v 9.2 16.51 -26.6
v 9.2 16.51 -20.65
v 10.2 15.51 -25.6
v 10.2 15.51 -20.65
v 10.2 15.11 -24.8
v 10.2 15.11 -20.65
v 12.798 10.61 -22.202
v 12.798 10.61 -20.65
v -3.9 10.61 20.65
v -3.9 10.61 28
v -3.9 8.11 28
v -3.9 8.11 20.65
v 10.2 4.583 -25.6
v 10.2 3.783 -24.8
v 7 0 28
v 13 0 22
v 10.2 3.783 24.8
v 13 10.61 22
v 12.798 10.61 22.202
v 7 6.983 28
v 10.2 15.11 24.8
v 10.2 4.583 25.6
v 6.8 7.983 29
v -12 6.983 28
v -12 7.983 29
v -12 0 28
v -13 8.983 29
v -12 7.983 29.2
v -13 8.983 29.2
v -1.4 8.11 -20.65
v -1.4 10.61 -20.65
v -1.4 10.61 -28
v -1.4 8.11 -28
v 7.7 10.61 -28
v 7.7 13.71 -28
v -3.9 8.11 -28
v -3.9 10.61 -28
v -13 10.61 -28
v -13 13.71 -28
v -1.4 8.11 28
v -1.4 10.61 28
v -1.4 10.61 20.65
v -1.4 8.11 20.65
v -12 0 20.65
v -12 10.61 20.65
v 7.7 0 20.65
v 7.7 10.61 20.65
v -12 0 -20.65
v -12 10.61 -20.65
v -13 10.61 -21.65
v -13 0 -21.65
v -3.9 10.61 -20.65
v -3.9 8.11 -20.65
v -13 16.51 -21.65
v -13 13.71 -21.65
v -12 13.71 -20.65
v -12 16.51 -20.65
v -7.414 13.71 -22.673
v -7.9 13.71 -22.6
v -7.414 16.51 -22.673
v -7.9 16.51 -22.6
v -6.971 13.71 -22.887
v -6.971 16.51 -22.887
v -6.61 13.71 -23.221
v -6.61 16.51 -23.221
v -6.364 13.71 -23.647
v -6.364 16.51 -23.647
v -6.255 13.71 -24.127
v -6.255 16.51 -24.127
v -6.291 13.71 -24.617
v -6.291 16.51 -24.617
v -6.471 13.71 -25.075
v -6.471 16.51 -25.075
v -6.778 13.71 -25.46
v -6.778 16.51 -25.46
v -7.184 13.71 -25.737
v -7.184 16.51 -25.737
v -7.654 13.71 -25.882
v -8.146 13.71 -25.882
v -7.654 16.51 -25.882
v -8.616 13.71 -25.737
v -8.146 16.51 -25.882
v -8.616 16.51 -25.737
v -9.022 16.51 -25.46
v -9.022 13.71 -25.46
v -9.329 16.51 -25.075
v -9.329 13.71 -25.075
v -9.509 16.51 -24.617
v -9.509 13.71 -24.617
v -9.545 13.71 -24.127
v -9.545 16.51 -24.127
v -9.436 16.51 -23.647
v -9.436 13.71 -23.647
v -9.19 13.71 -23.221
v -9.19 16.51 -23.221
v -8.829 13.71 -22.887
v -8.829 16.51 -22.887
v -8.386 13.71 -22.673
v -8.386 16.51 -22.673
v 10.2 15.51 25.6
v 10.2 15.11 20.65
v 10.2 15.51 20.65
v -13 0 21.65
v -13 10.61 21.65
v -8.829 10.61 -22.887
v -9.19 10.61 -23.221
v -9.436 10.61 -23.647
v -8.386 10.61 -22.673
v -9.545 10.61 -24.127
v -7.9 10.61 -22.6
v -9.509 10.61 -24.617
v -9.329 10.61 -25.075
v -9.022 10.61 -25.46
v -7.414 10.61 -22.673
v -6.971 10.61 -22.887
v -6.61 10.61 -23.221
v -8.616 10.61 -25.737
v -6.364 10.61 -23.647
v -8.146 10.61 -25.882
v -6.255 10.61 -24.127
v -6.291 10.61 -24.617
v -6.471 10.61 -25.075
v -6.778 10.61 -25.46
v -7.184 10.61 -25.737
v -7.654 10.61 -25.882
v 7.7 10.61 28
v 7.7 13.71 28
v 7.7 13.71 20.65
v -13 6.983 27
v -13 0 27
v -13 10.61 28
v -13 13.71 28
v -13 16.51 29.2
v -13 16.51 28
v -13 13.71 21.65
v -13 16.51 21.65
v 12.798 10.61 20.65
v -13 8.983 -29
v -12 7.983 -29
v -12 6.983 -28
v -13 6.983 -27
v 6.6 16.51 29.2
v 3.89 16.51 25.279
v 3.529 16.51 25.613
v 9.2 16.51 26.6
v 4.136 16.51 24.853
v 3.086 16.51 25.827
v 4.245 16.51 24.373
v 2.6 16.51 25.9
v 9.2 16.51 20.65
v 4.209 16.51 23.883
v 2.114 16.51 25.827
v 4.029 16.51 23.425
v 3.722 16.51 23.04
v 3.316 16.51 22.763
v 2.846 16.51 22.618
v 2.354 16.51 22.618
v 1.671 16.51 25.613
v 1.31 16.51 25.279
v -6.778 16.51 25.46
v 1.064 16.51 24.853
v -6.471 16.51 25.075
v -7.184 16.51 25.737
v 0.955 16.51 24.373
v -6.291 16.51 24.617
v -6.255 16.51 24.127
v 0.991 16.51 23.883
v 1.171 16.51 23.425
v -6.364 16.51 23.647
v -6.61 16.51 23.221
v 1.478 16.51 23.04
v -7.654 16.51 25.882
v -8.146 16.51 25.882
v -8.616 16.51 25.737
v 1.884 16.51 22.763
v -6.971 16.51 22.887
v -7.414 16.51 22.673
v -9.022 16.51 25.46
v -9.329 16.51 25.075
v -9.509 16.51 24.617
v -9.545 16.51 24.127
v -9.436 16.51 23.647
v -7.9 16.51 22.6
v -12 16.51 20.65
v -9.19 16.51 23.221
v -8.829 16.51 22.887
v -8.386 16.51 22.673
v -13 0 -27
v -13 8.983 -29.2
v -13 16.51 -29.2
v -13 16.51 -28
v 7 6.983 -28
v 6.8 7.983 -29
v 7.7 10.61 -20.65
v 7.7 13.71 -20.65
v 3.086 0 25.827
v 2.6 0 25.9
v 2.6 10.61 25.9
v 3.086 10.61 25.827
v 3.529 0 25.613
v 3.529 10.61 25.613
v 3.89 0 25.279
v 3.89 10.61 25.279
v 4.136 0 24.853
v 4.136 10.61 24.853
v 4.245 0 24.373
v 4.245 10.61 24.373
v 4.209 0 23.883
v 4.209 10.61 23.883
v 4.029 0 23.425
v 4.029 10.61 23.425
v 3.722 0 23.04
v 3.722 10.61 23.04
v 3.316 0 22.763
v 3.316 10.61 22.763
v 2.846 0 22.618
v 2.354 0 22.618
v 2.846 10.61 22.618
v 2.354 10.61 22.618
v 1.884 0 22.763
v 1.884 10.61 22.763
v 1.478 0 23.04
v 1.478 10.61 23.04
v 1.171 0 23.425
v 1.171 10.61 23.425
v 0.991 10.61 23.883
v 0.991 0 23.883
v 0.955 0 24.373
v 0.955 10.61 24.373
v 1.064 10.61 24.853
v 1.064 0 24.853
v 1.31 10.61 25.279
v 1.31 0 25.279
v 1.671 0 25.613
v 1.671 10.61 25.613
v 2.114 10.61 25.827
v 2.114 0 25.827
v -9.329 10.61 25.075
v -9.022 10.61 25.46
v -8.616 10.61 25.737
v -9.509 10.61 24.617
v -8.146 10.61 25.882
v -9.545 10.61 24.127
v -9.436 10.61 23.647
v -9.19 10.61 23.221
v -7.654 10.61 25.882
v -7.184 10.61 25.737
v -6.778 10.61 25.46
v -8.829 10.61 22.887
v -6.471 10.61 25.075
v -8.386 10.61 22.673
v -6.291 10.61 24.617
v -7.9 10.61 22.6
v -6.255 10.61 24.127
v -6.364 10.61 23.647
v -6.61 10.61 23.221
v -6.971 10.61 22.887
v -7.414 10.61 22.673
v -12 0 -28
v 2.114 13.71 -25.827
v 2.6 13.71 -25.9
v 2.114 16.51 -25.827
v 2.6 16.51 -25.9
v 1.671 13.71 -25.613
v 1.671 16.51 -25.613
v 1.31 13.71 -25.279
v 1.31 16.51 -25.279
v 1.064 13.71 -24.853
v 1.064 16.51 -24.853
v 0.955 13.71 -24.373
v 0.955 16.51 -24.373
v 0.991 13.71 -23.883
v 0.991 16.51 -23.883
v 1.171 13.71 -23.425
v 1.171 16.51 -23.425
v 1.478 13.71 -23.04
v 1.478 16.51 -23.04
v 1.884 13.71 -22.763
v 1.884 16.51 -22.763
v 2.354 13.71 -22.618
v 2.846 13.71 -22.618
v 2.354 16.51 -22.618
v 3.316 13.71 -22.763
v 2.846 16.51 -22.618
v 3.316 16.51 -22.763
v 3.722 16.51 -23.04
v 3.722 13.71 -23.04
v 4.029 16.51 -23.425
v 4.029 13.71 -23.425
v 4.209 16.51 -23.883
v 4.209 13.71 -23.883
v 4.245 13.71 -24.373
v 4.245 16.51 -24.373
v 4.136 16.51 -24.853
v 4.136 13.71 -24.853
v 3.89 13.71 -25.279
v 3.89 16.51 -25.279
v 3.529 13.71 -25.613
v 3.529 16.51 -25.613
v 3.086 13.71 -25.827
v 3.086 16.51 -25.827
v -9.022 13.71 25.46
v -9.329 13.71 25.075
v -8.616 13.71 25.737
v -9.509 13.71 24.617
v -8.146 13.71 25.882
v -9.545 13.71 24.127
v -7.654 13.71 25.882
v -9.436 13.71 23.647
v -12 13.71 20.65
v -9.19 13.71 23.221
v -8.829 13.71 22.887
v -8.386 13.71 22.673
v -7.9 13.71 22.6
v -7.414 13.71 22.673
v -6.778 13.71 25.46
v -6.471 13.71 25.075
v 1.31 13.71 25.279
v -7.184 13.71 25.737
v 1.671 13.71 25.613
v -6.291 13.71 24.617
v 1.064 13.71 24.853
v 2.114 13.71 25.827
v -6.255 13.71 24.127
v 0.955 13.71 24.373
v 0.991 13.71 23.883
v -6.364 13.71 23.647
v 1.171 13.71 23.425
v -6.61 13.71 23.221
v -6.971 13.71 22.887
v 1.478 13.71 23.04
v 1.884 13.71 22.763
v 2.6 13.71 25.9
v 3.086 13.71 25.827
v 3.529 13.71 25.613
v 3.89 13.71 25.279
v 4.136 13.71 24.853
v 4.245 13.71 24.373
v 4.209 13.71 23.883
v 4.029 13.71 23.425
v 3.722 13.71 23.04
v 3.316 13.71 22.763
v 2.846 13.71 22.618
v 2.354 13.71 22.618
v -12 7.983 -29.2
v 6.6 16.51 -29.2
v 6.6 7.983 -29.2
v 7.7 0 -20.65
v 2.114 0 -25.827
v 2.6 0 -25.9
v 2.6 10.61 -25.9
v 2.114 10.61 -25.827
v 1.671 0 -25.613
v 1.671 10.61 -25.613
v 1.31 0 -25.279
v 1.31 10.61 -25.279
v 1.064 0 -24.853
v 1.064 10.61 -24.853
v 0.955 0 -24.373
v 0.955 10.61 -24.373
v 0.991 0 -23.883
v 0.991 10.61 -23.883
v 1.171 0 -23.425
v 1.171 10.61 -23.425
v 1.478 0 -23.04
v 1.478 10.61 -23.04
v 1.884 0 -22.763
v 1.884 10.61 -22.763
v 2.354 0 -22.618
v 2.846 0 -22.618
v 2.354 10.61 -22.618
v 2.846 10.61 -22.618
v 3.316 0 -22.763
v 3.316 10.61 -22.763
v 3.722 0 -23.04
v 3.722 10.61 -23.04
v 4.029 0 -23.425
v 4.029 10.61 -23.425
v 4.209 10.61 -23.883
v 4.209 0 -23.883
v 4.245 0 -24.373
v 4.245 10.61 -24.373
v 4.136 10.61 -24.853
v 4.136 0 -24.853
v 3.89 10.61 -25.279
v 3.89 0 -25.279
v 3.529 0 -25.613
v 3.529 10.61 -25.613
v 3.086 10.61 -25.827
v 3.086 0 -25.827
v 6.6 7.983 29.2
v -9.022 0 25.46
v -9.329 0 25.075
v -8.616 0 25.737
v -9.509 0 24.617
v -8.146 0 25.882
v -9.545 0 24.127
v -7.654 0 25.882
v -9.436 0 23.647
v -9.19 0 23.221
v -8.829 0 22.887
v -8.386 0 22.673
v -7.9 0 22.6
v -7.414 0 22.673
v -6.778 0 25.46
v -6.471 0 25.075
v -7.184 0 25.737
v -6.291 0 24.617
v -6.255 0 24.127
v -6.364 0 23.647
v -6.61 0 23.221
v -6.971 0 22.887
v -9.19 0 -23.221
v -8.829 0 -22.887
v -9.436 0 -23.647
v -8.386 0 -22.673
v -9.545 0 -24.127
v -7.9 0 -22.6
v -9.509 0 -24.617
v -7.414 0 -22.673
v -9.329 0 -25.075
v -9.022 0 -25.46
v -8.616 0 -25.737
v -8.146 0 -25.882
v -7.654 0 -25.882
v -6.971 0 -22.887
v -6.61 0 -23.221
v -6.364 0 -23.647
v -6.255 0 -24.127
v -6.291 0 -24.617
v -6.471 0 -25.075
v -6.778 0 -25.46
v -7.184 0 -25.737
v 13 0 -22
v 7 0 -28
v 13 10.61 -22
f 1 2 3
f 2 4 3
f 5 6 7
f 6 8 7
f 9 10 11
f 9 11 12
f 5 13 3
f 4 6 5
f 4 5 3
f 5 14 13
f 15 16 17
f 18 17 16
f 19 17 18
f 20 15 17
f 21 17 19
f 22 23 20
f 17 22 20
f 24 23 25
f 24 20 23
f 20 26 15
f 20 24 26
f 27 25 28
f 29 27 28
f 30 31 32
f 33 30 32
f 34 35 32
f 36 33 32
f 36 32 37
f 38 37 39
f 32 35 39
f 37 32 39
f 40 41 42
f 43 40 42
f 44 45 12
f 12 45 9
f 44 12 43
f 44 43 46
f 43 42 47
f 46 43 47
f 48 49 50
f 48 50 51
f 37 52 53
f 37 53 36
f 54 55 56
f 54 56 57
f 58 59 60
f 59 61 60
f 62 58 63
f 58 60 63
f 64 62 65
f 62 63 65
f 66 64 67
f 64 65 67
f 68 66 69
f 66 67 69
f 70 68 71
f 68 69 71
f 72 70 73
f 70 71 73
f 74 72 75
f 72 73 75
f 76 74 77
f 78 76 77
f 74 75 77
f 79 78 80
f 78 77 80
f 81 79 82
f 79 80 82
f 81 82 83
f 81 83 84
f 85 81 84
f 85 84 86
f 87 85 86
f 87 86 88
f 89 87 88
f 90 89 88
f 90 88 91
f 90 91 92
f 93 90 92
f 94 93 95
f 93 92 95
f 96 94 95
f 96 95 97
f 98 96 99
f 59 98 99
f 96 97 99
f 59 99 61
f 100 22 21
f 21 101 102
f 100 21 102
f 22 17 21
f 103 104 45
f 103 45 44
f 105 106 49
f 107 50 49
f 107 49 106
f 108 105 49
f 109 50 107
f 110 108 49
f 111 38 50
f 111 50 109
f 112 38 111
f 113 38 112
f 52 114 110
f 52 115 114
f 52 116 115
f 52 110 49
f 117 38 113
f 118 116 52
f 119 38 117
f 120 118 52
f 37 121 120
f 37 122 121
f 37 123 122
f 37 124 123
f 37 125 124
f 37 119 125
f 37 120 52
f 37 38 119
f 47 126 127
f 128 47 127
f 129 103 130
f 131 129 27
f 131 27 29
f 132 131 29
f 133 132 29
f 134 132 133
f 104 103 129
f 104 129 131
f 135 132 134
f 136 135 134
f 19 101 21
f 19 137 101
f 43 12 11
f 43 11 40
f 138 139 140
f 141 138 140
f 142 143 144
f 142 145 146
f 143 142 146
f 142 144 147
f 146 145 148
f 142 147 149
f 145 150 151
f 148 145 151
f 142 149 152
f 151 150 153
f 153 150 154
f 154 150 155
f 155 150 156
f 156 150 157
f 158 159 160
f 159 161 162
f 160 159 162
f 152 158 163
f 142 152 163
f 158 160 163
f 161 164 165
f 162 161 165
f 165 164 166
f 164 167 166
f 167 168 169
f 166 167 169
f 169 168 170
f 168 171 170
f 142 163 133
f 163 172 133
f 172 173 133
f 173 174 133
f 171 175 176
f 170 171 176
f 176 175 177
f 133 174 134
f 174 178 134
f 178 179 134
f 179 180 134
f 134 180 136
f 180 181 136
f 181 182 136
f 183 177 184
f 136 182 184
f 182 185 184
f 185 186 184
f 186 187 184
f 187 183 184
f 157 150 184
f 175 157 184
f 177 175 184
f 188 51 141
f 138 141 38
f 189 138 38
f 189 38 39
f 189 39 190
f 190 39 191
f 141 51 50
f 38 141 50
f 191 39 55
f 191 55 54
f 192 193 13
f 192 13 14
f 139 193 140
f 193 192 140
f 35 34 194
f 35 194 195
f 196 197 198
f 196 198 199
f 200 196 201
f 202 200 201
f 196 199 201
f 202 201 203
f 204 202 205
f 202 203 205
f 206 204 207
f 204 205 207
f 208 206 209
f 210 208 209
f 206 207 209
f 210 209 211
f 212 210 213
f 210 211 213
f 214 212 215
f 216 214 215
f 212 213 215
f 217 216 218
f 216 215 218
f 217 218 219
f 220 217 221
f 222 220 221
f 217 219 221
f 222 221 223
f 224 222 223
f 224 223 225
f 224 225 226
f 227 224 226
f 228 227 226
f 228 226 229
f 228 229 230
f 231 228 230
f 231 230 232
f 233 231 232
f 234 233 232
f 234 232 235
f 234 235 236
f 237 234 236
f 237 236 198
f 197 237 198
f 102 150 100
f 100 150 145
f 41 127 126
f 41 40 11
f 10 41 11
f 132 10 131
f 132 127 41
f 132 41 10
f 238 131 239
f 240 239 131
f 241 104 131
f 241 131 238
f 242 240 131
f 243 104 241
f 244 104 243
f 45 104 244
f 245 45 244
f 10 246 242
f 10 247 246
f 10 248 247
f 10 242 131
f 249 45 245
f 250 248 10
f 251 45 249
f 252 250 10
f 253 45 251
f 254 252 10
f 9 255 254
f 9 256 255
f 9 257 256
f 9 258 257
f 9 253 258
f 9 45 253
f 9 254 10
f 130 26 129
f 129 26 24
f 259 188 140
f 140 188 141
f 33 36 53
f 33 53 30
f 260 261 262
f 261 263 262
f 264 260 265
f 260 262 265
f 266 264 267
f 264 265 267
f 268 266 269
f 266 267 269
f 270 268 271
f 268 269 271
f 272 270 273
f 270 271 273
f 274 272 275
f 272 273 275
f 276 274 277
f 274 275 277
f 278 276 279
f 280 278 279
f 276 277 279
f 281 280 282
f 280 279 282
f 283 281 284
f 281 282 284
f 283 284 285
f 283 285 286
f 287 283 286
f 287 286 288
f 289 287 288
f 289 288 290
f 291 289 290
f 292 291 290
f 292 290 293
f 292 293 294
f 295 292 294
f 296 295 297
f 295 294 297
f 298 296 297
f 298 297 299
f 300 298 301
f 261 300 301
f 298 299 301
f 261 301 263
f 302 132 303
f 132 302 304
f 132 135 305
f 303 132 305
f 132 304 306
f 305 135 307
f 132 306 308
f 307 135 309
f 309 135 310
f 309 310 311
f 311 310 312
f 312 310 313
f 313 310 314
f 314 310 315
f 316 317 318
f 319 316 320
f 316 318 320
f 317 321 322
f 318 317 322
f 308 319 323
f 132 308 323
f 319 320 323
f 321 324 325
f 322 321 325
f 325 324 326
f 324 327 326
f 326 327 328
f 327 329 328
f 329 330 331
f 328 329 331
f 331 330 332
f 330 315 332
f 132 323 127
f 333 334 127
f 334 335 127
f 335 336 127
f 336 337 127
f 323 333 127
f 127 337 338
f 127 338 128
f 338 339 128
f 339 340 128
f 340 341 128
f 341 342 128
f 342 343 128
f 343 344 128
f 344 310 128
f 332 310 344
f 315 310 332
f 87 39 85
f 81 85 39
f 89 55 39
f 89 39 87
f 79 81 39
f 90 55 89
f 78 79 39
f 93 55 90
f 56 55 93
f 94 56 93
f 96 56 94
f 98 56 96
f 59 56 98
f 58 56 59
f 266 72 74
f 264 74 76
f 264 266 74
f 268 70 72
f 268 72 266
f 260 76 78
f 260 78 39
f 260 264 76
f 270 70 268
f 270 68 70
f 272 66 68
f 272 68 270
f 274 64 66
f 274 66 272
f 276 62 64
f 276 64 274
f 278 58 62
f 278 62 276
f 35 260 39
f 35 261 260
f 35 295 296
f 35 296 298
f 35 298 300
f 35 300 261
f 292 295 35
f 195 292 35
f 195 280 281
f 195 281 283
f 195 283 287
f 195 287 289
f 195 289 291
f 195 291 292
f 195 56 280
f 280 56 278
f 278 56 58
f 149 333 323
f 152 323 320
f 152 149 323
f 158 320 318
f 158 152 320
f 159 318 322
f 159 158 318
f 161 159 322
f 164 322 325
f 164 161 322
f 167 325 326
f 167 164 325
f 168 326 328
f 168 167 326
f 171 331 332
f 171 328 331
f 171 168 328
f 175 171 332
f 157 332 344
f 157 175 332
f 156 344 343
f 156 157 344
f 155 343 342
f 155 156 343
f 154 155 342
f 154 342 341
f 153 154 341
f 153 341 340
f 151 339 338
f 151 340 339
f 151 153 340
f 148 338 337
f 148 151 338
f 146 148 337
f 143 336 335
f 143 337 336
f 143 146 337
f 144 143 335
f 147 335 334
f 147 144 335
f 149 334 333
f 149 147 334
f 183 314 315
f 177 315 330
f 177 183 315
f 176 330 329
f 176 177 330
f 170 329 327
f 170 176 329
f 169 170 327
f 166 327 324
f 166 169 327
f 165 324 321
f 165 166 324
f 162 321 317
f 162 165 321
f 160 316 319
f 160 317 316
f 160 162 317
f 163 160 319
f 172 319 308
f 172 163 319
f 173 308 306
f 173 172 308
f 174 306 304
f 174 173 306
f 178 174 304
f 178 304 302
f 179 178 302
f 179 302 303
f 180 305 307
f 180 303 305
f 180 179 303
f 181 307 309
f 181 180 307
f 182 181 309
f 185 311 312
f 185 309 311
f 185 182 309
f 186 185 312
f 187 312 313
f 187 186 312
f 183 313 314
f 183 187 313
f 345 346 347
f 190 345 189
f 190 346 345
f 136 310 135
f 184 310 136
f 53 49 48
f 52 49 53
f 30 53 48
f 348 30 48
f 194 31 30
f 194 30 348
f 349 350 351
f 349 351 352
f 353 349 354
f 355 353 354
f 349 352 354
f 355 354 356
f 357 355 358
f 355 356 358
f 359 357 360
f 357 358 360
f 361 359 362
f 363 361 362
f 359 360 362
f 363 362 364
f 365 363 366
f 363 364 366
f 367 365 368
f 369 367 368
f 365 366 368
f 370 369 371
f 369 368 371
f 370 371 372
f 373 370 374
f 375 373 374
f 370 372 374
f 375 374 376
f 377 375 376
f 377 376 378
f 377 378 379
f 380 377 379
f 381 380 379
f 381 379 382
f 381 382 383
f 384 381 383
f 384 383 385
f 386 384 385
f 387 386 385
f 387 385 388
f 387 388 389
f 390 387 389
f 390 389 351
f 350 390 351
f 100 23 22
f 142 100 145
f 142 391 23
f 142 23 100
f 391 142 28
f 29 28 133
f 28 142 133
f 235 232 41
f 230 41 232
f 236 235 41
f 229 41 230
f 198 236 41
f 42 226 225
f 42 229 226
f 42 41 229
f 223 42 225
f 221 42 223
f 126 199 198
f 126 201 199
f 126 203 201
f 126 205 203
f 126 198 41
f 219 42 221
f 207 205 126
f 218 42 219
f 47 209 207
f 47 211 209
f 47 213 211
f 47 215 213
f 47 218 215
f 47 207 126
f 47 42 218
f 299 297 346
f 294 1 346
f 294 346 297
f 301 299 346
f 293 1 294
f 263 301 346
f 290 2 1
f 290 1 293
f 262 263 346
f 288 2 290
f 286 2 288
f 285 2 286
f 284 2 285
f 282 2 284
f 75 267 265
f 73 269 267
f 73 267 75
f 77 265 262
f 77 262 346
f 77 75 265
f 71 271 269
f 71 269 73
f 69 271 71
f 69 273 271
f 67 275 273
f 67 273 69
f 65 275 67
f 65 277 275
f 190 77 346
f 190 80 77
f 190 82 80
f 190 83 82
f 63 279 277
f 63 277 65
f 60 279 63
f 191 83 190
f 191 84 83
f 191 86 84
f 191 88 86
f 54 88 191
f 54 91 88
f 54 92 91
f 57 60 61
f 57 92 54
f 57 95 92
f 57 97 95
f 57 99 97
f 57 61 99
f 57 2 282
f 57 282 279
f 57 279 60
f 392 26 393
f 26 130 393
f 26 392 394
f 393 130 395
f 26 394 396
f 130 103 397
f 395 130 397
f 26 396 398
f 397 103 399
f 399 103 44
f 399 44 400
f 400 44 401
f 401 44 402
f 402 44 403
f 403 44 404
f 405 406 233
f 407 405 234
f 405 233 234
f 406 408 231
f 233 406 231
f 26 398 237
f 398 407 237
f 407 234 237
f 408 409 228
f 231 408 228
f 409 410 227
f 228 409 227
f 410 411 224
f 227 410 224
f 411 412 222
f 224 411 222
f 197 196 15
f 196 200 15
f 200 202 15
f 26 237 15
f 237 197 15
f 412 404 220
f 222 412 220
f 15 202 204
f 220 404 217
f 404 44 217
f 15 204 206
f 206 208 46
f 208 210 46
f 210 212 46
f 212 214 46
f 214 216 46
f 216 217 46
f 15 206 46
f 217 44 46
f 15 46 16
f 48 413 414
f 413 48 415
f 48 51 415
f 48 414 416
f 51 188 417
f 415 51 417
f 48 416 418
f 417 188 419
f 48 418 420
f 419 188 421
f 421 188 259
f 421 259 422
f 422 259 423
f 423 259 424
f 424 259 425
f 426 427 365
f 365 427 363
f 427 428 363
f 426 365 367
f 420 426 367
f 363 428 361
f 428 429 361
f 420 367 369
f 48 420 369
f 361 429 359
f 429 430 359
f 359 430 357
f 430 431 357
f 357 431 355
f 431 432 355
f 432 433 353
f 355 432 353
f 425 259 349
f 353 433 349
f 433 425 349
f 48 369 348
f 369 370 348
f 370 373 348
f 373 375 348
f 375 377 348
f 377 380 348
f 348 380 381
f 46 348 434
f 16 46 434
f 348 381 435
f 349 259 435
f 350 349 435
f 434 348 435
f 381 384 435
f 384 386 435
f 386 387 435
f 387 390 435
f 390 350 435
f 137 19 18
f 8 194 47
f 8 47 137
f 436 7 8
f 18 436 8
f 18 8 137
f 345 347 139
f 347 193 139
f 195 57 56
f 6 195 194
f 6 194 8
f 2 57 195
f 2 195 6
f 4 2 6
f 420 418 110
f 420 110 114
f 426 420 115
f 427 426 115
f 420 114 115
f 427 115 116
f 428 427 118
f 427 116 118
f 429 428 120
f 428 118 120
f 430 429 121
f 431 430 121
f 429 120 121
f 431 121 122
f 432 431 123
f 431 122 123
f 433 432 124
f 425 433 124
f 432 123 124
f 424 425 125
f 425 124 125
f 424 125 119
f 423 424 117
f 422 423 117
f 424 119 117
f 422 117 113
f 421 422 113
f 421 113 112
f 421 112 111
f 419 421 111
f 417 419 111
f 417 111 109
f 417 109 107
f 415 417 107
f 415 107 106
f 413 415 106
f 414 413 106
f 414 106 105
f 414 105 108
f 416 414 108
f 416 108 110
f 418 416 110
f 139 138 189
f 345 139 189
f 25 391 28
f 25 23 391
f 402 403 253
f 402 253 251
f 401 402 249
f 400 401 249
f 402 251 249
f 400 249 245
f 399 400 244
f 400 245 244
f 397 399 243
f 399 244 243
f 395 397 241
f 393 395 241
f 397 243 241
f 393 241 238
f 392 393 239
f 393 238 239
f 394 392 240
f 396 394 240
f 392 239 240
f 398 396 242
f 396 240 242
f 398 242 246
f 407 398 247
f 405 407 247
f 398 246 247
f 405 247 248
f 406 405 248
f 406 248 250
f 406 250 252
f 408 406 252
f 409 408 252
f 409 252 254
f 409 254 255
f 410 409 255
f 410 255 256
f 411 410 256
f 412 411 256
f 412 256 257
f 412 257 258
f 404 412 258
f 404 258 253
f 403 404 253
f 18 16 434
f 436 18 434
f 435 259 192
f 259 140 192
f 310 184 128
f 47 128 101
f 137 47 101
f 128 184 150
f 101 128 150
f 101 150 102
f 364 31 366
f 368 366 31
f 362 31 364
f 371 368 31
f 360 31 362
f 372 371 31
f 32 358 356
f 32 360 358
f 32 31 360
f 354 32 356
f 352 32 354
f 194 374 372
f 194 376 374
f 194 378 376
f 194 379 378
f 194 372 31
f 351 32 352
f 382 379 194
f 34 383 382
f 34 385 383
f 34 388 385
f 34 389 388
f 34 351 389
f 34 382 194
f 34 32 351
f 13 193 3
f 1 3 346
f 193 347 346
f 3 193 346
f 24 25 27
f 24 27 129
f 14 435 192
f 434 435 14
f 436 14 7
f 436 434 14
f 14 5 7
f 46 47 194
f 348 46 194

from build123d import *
from OCP.BRepFilletAPI import BRepFilletAPI_MakeChamfer

# Parameters (mm, degrees)
SKETCH_1_W          = 26
SKETCH_1_H          = 56
EXTRUDE_1_DEPTH     = 10.61
SKETCH_2_R          = 1.65
SKETCH_2_W          = 20.7
SKETCH_2_H          = 41.3
CUT_EXTRUDE_1_DEPTH = 33.643101875
SKETCH_3_W          = 2.5
SKETCH_3_H          = 56
CUT_EXTRUDE_2_DEPTH = 2.5
SKETCH_4_W          = 23.2
SKETCH_4_H          = 2.8
SKETCH_4_W_2        = 2.5
SKETCH_4_H_2        = 3.1
EXTRUDE_2_DEPTH     = 7.35
SKETCH_5_W          = 23.2
SKETCH_5_H          = 8.527384077
EXTRUDE_5_DEPTH     = 1.2
SKETCH_6_R          = 1.65
CUT_EXTRUDE_3_DEPTH = 36.975270673
CHAMFER_1_SIZE      = 4.5
CHAMFER_1_SIZE2     = 2.598076211
CHAMFER_2_SIZE      = 1
CHAMFER_3_SIZE      = 6
CHAMFER_6_SIZE      = 3.6


with BuildPart() as part:
    # 草图1 → 凸台-拉伸1 (new body)
    with BuildSketch(Plane(origin=(0, 0, 0), x_dir=(1, 0, 0), z_dir=(0, 1, 0))):
        Rectangle(SKETCH_1_W, SKETCH_1_H)
    extrude(amount=EXTRUDE_1_DEPTH)

    # 草图2 → 切除-拉伸1 (cut, through all)
    with BuildSketch(Plane(origin=(0, 10.61, 0), x_dir=(1, 0, 0), z_dir=(0, 1, 0))):
        with Locations(Location((-7.9, 24.25, 0), (0, 0, 270))):
            Circle(SKETCH_2_R)
        with Locations(Location((2.6, 24.25, 0), (0, 0, 90))):
            Circle(SKETCH_2_R)
        with Locations(Location((2.6, -24.25, 0), (0, 0, 270))):
            Circle(SKETCH_2_R)
        with Locations(Location((-7.9, -24.25, 0), (0, 0, 90))):
            Circle(SKETCH_2_R)
        with Locations((-2.65, 0)):
            Rectangle(SKETCH_2_W, SKETCH_2_H)
    extrude(amount=-CUT_EXTRUDE_1_DEPTH, mode=Mode.SUBTRACT)

    # 草图3 → 切除-拉伸2 (cut)
    with BuildSketch(Plane(origin=(0, 10.61, 0), x_dir=(1, 0, 0), z_dir=(0, 1, 0))):
        with Locations((-2.65, 0)):
            Rectangle(SKETCH_3_W, SKETCH_3_H)
    extrude(amount=-CUT_EXTRUDE_2_DEPTH, mode=Mode.SUBTRACT)

    # 草图4 → 凸台-拉伸2 (add)
    with BuildSketch(Plane.XY.offset(-20.65)):
        with Locations((-1.4, 15.11)):
            Rectangle(SKETCH_4_W, SKETCH_4_H)
        with Locations((8.95, 12.16)):
            Rectangle(SKETCH_4_W_2, SKETCH_4_H_2)
    extrude_2 = extrude(amount=-EXTRUDE_2_DEPTH)

    # 草图5 → 凸台-拉伸5 (add)
    with BuildSketch(Plane(origin=(0, 0, -28), x_dir=(-1, 0, 0), z_dir=(0, 0, -1))):
        with Locations((1.4, 12.246307962)):
            Rectangle(SKETCH_5_W, SKETCH_5_H)
    extrude_5 = extrude(amount=EXTRUDE_5_DEPTH)

    # 草图6 → 切除-拉伸3 (cut, through all)
    with BuildSketch(Plane(origin=(0, 16.51, 0), x_dir=(1, 0, 0), z_dir=(0, 1, 0))):
        with Locations(Location((2.6, 24.25, 0), (0, 0, 90))):
            Circle(SKETCH_6_R)
        with Locations(Location((-7.9, 24.25, 0), (0, 0, 270))):
            Circle(SKETCH_6_R)
    cut_extrude_3 = extrude(amount=-CUT_EXTRUDE_3_DEPTH, mode=Mode.SUBTRACT)

    # 镜向2: 凸台-拉伸2, 凸台-拉伸5, 切除-拉伸3 across plane
    add(extrude_2.mirror(Plane.XY))
    add(extrude_5.mirror(Plane.XY))
    add(cut_extrude_3.mirror(Plane.XY), mode=Mode.SUBTRACT)

    # 倒角1: one chamfer whose edges measure the first distance from different faces: ONE call of the kernel's chamfer builder (chamfer() names one face for all edges)
    chamfer_1_edges_1 = [part.edges().sort_by_distance(p)[0] for p in [
        (10.2, 10.61, 24.325),
    ]]
    chamfer_1_side_1 = [part.faces().sort_by_distance(p)[0] for p in [
        (10.2, 13.309190963, 25.141179594),
    ]]
    chamfer_1_edges_2 = [part.edges().sort_by_distance(p)[0] for p in [
        (10.2, 10.61, -24.325),
    ]]
    chamfer_1_side_2 = [part.faces().sort_by_distance(p)[0] for p in [
        (10.2, 13.309190963, -25.141179594),
    ]]
    chamfer_1 = BRepFilletAPI_MakeChamfer(part.part.solid().wrapped)
    for e in chamfer_1_edges_1:
        chamfer_1.Add(CHAMFER_1_SIZE, CHAMFER_1_SIZE2, e.wrapped, chamfer_1_side_1[0].wrapped)  # the first distance lies on this face
    for e in chamfer_1_edges_2:
        chamfer_1.Add(CHAMFER_1_SIZE, CHAMFER_1_SIZE2, e.wrapped, chamfer_1_side_2[0].wrapped)  # the first distance lies on this face
    add(Compound.cast(chamfer_1.Shape()), mode=Mode.REPLACE)

    # 倒角2
    chamfer_2_edges = [part.edges().sort_by_distance(p)[0] for p in [
        (-13, 3.991307961, -28),
        (-1.4, 7.982615923, -28),
        (-13, 7.982615923, -28.6),
        (10.2, 16.51, 24.925),
        (-13, 15.11, 20.65),
        (-13, 3.991307961, 28),
        (-1.4, 7.982615923, 28),
        (-13, 7.982615923, 28.6),
        (-13, 5.305, 20.65),
        (-13, 5.305, -20.65),
        (10.2, 16.51, -24.925),
        (-13, 15.11, -20.65),
    ]]
    chamfer(chamfer_2_edges, length=CHAMFER_2_SIZE)

    # 倒角3
    chamfer_3_edges = [part.edges().sort_by_distance(p)[0] for p in [
        (13, 5.305, 28),
        (13, 5.305, -28),
    ]]
    chamfer(chamfer_3_edges, length=CHAMFER_3_SIZE)

    # 倒角6
    chamfer_6_edges = [part.edges().sort_by_distance(p)[0] for p in [
        (10.2, 11.746307961, 29.2),
        (10.2, 11.746307961, -29.2),
    ]]
    chamfer(chamfer_6_edges, length=CHAMFER_6_SIZE)


solid = part.part
